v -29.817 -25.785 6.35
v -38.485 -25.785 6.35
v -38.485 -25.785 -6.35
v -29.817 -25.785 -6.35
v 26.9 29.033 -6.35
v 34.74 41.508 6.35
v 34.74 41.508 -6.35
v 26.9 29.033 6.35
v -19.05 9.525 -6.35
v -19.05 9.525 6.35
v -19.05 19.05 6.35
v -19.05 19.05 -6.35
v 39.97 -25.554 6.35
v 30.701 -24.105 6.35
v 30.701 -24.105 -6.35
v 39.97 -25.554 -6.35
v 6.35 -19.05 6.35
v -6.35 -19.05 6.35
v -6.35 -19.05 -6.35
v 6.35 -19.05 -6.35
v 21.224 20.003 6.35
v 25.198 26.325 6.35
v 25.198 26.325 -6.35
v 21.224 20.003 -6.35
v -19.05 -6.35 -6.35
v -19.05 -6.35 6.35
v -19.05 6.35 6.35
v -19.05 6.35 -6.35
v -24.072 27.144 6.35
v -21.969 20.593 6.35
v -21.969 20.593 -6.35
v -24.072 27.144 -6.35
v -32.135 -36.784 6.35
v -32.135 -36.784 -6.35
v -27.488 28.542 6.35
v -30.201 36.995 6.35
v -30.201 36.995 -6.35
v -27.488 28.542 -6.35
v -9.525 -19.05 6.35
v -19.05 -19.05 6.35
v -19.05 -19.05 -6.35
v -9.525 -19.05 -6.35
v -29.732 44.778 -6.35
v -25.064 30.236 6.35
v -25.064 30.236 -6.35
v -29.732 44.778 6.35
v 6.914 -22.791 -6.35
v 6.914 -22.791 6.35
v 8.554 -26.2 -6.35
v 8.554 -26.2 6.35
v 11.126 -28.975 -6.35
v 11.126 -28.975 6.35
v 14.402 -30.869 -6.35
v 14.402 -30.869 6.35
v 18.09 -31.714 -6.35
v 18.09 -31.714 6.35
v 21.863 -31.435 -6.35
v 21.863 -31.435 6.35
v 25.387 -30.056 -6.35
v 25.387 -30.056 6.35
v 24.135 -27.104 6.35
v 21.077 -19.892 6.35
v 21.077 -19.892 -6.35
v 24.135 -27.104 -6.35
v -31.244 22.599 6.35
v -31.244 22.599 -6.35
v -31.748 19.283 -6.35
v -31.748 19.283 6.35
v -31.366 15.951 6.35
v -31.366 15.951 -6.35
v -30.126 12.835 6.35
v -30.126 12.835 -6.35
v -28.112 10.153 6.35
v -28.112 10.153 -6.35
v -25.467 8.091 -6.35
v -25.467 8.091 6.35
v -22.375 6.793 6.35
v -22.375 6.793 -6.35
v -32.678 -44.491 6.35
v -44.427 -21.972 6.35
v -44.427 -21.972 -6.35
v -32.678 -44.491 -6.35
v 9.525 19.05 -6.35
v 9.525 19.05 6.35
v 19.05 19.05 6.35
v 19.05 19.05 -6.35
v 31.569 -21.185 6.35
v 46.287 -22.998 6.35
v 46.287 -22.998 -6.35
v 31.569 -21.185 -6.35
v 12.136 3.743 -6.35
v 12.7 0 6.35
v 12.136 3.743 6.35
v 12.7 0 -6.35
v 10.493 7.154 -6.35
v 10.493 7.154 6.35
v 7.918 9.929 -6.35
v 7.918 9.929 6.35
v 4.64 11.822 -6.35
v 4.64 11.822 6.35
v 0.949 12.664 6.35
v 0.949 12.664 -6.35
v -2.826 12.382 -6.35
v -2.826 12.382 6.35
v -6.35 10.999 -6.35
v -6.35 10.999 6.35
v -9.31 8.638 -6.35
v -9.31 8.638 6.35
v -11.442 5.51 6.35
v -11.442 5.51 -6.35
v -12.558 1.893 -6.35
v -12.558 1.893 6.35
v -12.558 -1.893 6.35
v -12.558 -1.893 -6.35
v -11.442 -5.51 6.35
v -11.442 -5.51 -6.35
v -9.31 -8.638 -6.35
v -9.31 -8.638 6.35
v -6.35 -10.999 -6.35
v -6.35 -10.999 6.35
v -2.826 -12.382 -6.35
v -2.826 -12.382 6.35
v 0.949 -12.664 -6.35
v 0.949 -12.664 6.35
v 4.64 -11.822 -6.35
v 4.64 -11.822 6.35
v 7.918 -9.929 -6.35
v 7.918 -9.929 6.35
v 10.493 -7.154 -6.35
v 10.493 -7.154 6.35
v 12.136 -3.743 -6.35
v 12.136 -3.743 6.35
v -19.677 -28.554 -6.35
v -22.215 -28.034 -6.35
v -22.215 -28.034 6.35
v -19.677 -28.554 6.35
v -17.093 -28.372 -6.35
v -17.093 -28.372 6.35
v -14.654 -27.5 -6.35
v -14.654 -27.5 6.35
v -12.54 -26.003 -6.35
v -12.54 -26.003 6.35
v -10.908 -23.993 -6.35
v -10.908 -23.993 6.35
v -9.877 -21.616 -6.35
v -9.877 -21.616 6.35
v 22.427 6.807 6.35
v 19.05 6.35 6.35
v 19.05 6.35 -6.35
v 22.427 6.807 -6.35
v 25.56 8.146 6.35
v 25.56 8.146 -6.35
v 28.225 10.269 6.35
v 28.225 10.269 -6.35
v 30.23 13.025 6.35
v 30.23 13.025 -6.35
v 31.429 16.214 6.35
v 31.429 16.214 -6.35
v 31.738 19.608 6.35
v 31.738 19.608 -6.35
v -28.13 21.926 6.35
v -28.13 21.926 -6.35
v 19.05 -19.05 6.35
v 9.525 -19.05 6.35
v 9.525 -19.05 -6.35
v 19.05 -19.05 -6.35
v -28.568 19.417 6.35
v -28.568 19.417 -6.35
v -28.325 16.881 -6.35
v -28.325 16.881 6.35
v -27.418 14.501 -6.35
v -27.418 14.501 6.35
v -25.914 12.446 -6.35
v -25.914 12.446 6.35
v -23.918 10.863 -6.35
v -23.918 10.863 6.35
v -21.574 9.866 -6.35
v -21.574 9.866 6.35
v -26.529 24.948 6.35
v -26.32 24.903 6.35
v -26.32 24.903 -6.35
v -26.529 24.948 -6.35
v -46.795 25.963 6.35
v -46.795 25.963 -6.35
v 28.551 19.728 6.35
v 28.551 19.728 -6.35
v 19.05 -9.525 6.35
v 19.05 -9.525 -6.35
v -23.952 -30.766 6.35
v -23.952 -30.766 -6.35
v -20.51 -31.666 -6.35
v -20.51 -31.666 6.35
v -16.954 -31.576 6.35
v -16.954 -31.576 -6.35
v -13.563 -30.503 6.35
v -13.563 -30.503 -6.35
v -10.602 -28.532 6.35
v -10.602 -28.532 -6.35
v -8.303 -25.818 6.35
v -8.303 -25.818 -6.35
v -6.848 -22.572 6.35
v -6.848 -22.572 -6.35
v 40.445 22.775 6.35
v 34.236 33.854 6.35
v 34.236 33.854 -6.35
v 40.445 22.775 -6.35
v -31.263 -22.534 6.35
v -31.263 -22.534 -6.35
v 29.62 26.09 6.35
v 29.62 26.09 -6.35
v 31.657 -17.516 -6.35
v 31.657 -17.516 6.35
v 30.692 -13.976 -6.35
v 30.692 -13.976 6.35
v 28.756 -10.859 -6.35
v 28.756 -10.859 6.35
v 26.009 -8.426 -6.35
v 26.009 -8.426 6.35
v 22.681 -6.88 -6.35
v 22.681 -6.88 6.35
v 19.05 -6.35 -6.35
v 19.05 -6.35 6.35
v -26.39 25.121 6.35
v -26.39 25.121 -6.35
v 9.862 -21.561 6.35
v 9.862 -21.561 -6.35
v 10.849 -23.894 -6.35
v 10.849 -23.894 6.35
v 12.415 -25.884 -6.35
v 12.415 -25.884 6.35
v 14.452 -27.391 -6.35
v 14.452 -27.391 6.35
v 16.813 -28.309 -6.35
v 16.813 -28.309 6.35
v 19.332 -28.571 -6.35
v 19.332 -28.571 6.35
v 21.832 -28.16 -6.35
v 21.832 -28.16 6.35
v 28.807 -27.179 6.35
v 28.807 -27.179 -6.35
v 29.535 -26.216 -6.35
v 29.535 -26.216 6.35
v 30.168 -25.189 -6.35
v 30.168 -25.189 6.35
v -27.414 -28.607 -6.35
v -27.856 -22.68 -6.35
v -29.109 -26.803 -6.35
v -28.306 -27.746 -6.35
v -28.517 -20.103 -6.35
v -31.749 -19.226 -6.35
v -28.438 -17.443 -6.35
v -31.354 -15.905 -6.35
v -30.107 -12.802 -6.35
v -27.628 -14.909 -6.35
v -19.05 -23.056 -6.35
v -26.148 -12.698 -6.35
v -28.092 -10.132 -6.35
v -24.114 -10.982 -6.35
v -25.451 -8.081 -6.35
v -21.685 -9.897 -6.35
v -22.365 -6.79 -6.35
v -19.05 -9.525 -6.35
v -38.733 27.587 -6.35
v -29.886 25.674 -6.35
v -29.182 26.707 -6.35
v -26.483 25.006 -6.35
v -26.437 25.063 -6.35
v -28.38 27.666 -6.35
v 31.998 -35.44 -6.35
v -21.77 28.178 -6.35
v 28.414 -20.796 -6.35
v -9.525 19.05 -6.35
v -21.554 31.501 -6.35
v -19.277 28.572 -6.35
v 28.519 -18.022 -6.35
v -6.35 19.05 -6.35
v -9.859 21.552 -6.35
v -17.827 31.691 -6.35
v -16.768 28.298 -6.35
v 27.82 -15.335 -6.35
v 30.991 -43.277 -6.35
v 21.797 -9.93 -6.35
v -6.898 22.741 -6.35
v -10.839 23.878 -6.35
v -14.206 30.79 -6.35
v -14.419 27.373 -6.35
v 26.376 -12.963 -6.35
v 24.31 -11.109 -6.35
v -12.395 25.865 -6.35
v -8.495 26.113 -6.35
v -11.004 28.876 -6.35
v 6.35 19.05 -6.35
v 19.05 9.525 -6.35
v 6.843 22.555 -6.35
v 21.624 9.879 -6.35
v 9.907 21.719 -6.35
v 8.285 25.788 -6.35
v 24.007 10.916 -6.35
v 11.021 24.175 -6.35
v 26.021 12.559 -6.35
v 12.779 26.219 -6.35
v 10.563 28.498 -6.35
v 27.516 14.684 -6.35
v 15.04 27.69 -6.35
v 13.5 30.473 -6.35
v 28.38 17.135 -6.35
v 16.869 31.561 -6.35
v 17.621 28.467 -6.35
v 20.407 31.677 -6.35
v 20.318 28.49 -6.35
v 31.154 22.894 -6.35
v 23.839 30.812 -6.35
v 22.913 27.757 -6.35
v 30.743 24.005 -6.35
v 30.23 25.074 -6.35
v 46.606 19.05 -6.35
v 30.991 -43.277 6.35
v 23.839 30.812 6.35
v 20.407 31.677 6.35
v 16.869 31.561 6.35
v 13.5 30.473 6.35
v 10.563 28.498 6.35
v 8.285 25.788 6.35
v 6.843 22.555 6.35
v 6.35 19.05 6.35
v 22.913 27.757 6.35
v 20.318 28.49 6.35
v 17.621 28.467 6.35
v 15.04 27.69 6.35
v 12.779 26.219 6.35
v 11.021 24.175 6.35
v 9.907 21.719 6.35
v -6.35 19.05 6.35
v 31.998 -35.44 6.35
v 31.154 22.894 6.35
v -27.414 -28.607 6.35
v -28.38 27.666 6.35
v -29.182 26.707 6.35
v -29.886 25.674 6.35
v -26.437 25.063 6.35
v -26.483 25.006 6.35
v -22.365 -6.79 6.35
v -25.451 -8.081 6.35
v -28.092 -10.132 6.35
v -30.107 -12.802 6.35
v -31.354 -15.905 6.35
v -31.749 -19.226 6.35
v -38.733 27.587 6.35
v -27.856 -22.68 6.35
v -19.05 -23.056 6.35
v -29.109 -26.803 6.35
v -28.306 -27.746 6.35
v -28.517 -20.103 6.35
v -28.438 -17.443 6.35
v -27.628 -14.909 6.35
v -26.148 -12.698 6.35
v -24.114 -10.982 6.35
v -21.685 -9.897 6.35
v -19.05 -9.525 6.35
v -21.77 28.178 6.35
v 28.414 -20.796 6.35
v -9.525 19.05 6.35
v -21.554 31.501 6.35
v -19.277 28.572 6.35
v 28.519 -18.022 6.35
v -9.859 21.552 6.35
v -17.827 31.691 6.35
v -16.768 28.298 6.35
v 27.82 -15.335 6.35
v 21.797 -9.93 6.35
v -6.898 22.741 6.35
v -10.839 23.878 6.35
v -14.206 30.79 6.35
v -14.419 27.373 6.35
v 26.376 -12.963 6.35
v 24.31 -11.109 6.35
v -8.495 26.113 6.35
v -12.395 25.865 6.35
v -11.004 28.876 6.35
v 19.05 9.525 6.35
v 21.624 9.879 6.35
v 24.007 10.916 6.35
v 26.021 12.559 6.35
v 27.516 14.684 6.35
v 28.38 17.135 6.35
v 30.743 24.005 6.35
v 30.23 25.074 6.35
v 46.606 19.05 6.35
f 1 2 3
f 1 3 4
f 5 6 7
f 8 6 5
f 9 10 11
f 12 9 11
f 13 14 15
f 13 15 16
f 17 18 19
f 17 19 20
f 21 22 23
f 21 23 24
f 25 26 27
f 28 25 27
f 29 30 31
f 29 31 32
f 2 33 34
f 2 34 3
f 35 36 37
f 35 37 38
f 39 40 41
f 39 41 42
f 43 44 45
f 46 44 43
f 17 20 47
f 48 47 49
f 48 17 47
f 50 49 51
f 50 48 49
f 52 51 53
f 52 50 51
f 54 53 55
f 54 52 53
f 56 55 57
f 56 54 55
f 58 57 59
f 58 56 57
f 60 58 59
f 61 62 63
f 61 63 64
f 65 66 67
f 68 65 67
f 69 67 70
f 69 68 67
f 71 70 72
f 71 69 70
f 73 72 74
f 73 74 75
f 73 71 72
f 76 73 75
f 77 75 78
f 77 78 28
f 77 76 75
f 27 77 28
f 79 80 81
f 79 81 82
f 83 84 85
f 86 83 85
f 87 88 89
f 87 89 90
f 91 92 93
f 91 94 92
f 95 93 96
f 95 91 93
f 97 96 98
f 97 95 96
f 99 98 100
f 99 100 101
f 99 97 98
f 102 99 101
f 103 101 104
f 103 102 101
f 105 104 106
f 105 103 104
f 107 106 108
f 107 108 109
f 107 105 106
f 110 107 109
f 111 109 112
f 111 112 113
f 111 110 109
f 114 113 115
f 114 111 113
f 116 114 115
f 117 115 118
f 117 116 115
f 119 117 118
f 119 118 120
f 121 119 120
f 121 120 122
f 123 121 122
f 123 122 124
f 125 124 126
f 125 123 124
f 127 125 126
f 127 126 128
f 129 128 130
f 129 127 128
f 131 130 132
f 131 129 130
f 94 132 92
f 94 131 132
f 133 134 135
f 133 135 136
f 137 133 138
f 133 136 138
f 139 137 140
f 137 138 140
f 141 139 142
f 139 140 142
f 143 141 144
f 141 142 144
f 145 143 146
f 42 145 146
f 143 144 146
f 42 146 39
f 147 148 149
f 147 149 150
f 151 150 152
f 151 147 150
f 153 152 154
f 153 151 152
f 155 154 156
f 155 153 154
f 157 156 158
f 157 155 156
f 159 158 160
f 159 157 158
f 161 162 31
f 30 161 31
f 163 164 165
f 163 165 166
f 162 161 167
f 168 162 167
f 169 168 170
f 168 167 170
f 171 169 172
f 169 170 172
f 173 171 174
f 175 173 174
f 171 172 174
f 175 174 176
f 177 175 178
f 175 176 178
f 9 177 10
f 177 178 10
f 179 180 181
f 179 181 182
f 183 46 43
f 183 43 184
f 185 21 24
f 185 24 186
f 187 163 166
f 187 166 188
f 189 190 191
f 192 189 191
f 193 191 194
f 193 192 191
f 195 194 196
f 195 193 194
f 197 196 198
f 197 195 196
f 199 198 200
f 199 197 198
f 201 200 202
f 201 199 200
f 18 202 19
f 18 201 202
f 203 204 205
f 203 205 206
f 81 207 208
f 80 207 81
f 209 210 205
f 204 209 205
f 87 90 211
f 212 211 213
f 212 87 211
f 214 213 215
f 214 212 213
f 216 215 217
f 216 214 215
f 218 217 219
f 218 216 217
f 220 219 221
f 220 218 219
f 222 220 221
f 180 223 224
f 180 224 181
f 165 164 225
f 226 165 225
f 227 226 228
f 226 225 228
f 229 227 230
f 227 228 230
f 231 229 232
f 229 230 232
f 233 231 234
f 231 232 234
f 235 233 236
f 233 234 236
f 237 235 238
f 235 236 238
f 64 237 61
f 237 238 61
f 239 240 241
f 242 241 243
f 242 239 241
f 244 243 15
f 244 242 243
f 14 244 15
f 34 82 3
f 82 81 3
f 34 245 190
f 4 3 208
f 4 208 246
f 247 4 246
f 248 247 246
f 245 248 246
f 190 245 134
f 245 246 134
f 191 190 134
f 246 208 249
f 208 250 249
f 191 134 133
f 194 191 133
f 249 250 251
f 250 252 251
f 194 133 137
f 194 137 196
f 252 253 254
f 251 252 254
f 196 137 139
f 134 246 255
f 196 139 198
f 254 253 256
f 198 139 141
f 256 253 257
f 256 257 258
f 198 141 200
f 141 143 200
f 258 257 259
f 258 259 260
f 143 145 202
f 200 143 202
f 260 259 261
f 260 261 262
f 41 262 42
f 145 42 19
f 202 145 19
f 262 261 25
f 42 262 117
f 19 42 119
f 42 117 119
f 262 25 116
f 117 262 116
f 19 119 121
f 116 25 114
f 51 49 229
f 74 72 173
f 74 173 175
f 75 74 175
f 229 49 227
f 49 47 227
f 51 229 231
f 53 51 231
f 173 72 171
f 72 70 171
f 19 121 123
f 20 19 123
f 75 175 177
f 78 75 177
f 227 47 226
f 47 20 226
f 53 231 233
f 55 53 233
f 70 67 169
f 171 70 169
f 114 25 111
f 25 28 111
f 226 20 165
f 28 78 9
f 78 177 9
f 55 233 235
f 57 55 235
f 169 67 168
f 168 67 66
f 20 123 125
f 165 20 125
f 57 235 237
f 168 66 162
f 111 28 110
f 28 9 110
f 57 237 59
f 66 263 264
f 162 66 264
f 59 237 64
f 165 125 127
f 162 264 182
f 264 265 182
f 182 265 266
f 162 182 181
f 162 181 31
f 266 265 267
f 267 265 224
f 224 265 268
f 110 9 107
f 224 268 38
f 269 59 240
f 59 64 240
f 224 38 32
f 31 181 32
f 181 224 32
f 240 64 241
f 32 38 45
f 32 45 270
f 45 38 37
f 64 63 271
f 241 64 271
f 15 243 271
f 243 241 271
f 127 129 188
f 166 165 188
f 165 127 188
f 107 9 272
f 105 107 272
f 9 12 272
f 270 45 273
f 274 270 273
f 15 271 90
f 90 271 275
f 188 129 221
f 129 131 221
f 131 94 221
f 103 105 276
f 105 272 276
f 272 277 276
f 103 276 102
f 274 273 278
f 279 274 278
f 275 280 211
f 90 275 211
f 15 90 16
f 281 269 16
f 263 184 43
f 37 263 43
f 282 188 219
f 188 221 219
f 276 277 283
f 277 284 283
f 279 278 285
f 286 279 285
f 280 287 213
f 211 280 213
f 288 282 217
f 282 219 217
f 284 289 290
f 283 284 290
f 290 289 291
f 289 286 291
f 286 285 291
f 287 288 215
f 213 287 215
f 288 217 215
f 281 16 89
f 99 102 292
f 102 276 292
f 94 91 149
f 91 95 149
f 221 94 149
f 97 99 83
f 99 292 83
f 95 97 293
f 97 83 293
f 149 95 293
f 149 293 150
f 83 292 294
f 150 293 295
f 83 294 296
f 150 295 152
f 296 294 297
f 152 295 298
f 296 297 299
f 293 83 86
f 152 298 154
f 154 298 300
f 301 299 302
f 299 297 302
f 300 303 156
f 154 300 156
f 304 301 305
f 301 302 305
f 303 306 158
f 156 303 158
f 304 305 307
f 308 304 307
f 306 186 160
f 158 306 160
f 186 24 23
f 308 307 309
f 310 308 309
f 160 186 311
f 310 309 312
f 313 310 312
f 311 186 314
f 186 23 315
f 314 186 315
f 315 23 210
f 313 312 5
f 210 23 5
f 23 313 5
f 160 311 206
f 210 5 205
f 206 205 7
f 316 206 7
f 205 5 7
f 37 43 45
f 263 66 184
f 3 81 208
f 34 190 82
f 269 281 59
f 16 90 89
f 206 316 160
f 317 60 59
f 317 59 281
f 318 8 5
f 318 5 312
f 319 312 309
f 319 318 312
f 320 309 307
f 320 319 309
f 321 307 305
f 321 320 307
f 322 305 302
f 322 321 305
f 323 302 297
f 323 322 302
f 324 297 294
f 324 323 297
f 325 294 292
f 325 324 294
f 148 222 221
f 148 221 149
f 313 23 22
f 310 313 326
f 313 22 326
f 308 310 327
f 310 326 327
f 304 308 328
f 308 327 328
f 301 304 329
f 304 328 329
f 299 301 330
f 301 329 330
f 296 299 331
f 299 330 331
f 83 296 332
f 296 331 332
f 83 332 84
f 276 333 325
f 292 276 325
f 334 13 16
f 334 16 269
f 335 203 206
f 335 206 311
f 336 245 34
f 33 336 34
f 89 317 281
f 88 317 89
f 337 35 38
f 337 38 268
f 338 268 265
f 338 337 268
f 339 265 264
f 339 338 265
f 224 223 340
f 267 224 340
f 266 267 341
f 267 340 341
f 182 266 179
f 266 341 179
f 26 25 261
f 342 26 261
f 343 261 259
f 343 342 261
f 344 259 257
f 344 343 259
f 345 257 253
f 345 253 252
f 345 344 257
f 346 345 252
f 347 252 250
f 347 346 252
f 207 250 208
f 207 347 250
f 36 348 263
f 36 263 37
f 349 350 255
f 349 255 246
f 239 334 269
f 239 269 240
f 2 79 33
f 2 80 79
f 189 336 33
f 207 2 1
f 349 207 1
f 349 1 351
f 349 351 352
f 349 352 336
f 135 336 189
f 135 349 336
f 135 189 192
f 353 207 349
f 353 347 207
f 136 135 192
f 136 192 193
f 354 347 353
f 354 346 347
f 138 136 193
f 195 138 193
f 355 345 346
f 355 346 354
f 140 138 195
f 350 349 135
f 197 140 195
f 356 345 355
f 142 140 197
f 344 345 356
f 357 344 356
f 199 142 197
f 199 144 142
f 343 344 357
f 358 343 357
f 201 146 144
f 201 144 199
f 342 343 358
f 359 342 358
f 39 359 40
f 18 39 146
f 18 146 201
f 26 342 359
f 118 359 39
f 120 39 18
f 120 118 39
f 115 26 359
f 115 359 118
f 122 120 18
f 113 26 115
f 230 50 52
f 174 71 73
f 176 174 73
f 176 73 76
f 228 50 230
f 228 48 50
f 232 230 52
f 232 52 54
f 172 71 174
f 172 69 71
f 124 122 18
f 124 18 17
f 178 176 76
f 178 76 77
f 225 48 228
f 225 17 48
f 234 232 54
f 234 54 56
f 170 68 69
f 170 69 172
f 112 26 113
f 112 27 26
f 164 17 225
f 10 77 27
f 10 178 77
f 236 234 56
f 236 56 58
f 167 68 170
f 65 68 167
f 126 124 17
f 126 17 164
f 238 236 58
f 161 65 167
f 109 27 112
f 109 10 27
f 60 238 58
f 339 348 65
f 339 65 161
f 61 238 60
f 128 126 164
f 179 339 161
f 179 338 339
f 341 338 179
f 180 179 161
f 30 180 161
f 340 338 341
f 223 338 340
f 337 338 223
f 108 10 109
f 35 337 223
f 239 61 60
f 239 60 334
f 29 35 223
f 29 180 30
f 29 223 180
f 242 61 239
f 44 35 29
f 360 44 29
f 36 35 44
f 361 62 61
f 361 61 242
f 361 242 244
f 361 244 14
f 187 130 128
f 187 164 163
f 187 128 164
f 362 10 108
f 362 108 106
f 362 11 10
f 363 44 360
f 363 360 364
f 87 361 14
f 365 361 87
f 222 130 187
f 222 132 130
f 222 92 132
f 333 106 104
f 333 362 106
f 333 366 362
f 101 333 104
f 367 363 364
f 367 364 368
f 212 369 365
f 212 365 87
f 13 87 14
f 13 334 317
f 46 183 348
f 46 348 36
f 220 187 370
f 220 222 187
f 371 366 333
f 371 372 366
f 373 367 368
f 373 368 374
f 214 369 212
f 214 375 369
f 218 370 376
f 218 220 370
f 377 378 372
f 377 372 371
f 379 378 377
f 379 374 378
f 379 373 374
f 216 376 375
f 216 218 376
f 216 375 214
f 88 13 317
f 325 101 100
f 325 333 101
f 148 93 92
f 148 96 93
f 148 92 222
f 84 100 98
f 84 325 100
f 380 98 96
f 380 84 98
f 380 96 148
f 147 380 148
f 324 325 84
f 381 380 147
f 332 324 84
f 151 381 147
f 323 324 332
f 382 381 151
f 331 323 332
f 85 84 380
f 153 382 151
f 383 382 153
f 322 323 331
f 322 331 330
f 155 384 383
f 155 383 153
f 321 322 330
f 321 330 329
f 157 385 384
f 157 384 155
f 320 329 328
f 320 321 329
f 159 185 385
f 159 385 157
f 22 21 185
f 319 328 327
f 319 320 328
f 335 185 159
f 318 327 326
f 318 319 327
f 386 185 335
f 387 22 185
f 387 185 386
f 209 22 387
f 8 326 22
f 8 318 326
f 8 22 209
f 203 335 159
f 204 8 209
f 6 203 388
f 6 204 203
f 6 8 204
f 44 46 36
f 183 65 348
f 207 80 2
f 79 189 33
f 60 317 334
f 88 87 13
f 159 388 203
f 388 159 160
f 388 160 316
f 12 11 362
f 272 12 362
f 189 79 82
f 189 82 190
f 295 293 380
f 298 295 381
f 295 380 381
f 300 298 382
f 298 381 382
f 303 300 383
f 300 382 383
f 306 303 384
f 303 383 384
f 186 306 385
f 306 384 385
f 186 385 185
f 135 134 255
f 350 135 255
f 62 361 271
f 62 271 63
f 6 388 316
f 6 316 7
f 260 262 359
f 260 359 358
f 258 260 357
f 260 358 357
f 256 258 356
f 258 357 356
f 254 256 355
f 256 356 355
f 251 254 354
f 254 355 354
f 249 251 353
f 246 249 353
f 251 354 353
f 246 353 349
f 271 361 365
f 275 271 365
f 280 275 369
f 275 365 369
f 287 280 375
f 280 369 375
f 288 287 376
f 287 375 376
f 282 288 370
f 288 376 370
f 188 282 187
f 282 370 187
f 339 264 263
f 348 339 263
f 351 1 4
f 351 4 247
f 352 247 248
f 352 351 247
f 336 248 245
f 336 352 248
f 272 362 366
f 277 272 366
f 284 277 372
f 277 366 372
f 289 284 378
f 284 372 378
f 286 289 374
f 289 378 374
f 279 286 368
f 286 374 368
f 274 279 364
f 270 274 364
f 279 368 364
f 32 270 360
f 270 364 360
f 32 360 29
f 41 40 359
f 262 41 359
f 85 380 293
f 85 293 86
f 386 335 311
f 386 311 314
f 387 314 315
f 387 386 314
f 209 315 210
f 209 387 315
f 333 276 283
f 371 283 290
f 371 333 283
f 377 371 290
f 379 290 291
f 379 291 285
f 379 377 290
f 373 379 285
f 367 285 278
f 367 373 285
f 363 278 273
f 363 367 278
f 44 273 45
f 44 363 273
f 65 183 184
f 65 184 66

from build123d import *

# Parameters (mm, degrees)
F0_W     = 38.1
F0_H     = 38.1
F0_R     = 12.7
F1_DEPTH = 6.35
F2_R     = 12.7
F2_R_2   = 9.525
F3_DEPTH = 12.7
F5_DEPTH = 12.7


with BuildPart() as f1:
    # F0 (on Top) → F1 (new body, symmetric)
    with BuildSketch(Plane.XY):
        Rectangle(F0_W, F0_H)
        Circle(F0_R, mode=Mode.SUBTRACT)
    extrude(amount=F1_DEPTH, both=True)

    # F2 (on face) → F3 (join)
    with BuildSketch(Plane.XY.offset(6.35)):
        with Locations((-19.05, 19.05)):
            Circle(F2_R)
        with Locations((-19.05, 19.05)):
            Circle(F2_R_2, mode=Mode.SUBTRACT)
        with Locations((19.05, 19.05)):
            Circle(F2_R)
        with Locations((19.05, 19.05)):
            Circle(F2_R_2, mode=Mode.SUBTRACT)
        with Locations((19.05, -19.05)):
            Circle(F2_R)
        with Locations((19.05, -19.05)):
            Circle(F2_R_2, mode=Mode.SUBTRACT)
        with Locations((-19.05, -19.05)):
            Circle(F2_R)
        with Locations((-19.05, -19.05)):
            Circle(F2_R_2, mode=Mode.SUBTRACT)
    extrude(amount=-F3_DEPTH)

    # F4 (on face) → F5 (join)
    with BuildSketch(Plane.XY.offset(6.35)):
        Polygon((34.739992, 41.507824), (21.224035, 20.002501), (46.606169, 19.05), align=None)
        Polygon((40.44469, 22.77462), (27.74573, 22.937145), (34.235961, 33.853505), align=None, mode=Mode.SUBTRACT)
        Polygon((46.286524, -22.998363), (21.077219, -19.891765), (30.991478, -43.276963), align=None)
        Polygon((31.997671, -35.439923), (27.421833, -23.59291), (39.969566, -25.553625), align=None, mode=Mode.SUBTRACT)
        Polygon((-32.67766, -44.491031), (-19.05, -23.056319), (-44.426835, -21.971775), align=None)
        Polygon((-38.485192, -25.785192), (-25.785192, -25.785192), (-32.135192, -36.783715), align=None, mode=Mode.SUBTRACT)
        Polygon((-21.969239, 20.593261), (-29.732018, 44.777952), (-46.795185, 25.962843), align=None)
        Polygon((-30.201157, 36.994885), (-26.319768, 24.902539), (-38.732741, 27.58733), align=None, mode=Mode.SUBTRACT)
    extrude(amount=-F5_DEPTH)


solid = f1.part
